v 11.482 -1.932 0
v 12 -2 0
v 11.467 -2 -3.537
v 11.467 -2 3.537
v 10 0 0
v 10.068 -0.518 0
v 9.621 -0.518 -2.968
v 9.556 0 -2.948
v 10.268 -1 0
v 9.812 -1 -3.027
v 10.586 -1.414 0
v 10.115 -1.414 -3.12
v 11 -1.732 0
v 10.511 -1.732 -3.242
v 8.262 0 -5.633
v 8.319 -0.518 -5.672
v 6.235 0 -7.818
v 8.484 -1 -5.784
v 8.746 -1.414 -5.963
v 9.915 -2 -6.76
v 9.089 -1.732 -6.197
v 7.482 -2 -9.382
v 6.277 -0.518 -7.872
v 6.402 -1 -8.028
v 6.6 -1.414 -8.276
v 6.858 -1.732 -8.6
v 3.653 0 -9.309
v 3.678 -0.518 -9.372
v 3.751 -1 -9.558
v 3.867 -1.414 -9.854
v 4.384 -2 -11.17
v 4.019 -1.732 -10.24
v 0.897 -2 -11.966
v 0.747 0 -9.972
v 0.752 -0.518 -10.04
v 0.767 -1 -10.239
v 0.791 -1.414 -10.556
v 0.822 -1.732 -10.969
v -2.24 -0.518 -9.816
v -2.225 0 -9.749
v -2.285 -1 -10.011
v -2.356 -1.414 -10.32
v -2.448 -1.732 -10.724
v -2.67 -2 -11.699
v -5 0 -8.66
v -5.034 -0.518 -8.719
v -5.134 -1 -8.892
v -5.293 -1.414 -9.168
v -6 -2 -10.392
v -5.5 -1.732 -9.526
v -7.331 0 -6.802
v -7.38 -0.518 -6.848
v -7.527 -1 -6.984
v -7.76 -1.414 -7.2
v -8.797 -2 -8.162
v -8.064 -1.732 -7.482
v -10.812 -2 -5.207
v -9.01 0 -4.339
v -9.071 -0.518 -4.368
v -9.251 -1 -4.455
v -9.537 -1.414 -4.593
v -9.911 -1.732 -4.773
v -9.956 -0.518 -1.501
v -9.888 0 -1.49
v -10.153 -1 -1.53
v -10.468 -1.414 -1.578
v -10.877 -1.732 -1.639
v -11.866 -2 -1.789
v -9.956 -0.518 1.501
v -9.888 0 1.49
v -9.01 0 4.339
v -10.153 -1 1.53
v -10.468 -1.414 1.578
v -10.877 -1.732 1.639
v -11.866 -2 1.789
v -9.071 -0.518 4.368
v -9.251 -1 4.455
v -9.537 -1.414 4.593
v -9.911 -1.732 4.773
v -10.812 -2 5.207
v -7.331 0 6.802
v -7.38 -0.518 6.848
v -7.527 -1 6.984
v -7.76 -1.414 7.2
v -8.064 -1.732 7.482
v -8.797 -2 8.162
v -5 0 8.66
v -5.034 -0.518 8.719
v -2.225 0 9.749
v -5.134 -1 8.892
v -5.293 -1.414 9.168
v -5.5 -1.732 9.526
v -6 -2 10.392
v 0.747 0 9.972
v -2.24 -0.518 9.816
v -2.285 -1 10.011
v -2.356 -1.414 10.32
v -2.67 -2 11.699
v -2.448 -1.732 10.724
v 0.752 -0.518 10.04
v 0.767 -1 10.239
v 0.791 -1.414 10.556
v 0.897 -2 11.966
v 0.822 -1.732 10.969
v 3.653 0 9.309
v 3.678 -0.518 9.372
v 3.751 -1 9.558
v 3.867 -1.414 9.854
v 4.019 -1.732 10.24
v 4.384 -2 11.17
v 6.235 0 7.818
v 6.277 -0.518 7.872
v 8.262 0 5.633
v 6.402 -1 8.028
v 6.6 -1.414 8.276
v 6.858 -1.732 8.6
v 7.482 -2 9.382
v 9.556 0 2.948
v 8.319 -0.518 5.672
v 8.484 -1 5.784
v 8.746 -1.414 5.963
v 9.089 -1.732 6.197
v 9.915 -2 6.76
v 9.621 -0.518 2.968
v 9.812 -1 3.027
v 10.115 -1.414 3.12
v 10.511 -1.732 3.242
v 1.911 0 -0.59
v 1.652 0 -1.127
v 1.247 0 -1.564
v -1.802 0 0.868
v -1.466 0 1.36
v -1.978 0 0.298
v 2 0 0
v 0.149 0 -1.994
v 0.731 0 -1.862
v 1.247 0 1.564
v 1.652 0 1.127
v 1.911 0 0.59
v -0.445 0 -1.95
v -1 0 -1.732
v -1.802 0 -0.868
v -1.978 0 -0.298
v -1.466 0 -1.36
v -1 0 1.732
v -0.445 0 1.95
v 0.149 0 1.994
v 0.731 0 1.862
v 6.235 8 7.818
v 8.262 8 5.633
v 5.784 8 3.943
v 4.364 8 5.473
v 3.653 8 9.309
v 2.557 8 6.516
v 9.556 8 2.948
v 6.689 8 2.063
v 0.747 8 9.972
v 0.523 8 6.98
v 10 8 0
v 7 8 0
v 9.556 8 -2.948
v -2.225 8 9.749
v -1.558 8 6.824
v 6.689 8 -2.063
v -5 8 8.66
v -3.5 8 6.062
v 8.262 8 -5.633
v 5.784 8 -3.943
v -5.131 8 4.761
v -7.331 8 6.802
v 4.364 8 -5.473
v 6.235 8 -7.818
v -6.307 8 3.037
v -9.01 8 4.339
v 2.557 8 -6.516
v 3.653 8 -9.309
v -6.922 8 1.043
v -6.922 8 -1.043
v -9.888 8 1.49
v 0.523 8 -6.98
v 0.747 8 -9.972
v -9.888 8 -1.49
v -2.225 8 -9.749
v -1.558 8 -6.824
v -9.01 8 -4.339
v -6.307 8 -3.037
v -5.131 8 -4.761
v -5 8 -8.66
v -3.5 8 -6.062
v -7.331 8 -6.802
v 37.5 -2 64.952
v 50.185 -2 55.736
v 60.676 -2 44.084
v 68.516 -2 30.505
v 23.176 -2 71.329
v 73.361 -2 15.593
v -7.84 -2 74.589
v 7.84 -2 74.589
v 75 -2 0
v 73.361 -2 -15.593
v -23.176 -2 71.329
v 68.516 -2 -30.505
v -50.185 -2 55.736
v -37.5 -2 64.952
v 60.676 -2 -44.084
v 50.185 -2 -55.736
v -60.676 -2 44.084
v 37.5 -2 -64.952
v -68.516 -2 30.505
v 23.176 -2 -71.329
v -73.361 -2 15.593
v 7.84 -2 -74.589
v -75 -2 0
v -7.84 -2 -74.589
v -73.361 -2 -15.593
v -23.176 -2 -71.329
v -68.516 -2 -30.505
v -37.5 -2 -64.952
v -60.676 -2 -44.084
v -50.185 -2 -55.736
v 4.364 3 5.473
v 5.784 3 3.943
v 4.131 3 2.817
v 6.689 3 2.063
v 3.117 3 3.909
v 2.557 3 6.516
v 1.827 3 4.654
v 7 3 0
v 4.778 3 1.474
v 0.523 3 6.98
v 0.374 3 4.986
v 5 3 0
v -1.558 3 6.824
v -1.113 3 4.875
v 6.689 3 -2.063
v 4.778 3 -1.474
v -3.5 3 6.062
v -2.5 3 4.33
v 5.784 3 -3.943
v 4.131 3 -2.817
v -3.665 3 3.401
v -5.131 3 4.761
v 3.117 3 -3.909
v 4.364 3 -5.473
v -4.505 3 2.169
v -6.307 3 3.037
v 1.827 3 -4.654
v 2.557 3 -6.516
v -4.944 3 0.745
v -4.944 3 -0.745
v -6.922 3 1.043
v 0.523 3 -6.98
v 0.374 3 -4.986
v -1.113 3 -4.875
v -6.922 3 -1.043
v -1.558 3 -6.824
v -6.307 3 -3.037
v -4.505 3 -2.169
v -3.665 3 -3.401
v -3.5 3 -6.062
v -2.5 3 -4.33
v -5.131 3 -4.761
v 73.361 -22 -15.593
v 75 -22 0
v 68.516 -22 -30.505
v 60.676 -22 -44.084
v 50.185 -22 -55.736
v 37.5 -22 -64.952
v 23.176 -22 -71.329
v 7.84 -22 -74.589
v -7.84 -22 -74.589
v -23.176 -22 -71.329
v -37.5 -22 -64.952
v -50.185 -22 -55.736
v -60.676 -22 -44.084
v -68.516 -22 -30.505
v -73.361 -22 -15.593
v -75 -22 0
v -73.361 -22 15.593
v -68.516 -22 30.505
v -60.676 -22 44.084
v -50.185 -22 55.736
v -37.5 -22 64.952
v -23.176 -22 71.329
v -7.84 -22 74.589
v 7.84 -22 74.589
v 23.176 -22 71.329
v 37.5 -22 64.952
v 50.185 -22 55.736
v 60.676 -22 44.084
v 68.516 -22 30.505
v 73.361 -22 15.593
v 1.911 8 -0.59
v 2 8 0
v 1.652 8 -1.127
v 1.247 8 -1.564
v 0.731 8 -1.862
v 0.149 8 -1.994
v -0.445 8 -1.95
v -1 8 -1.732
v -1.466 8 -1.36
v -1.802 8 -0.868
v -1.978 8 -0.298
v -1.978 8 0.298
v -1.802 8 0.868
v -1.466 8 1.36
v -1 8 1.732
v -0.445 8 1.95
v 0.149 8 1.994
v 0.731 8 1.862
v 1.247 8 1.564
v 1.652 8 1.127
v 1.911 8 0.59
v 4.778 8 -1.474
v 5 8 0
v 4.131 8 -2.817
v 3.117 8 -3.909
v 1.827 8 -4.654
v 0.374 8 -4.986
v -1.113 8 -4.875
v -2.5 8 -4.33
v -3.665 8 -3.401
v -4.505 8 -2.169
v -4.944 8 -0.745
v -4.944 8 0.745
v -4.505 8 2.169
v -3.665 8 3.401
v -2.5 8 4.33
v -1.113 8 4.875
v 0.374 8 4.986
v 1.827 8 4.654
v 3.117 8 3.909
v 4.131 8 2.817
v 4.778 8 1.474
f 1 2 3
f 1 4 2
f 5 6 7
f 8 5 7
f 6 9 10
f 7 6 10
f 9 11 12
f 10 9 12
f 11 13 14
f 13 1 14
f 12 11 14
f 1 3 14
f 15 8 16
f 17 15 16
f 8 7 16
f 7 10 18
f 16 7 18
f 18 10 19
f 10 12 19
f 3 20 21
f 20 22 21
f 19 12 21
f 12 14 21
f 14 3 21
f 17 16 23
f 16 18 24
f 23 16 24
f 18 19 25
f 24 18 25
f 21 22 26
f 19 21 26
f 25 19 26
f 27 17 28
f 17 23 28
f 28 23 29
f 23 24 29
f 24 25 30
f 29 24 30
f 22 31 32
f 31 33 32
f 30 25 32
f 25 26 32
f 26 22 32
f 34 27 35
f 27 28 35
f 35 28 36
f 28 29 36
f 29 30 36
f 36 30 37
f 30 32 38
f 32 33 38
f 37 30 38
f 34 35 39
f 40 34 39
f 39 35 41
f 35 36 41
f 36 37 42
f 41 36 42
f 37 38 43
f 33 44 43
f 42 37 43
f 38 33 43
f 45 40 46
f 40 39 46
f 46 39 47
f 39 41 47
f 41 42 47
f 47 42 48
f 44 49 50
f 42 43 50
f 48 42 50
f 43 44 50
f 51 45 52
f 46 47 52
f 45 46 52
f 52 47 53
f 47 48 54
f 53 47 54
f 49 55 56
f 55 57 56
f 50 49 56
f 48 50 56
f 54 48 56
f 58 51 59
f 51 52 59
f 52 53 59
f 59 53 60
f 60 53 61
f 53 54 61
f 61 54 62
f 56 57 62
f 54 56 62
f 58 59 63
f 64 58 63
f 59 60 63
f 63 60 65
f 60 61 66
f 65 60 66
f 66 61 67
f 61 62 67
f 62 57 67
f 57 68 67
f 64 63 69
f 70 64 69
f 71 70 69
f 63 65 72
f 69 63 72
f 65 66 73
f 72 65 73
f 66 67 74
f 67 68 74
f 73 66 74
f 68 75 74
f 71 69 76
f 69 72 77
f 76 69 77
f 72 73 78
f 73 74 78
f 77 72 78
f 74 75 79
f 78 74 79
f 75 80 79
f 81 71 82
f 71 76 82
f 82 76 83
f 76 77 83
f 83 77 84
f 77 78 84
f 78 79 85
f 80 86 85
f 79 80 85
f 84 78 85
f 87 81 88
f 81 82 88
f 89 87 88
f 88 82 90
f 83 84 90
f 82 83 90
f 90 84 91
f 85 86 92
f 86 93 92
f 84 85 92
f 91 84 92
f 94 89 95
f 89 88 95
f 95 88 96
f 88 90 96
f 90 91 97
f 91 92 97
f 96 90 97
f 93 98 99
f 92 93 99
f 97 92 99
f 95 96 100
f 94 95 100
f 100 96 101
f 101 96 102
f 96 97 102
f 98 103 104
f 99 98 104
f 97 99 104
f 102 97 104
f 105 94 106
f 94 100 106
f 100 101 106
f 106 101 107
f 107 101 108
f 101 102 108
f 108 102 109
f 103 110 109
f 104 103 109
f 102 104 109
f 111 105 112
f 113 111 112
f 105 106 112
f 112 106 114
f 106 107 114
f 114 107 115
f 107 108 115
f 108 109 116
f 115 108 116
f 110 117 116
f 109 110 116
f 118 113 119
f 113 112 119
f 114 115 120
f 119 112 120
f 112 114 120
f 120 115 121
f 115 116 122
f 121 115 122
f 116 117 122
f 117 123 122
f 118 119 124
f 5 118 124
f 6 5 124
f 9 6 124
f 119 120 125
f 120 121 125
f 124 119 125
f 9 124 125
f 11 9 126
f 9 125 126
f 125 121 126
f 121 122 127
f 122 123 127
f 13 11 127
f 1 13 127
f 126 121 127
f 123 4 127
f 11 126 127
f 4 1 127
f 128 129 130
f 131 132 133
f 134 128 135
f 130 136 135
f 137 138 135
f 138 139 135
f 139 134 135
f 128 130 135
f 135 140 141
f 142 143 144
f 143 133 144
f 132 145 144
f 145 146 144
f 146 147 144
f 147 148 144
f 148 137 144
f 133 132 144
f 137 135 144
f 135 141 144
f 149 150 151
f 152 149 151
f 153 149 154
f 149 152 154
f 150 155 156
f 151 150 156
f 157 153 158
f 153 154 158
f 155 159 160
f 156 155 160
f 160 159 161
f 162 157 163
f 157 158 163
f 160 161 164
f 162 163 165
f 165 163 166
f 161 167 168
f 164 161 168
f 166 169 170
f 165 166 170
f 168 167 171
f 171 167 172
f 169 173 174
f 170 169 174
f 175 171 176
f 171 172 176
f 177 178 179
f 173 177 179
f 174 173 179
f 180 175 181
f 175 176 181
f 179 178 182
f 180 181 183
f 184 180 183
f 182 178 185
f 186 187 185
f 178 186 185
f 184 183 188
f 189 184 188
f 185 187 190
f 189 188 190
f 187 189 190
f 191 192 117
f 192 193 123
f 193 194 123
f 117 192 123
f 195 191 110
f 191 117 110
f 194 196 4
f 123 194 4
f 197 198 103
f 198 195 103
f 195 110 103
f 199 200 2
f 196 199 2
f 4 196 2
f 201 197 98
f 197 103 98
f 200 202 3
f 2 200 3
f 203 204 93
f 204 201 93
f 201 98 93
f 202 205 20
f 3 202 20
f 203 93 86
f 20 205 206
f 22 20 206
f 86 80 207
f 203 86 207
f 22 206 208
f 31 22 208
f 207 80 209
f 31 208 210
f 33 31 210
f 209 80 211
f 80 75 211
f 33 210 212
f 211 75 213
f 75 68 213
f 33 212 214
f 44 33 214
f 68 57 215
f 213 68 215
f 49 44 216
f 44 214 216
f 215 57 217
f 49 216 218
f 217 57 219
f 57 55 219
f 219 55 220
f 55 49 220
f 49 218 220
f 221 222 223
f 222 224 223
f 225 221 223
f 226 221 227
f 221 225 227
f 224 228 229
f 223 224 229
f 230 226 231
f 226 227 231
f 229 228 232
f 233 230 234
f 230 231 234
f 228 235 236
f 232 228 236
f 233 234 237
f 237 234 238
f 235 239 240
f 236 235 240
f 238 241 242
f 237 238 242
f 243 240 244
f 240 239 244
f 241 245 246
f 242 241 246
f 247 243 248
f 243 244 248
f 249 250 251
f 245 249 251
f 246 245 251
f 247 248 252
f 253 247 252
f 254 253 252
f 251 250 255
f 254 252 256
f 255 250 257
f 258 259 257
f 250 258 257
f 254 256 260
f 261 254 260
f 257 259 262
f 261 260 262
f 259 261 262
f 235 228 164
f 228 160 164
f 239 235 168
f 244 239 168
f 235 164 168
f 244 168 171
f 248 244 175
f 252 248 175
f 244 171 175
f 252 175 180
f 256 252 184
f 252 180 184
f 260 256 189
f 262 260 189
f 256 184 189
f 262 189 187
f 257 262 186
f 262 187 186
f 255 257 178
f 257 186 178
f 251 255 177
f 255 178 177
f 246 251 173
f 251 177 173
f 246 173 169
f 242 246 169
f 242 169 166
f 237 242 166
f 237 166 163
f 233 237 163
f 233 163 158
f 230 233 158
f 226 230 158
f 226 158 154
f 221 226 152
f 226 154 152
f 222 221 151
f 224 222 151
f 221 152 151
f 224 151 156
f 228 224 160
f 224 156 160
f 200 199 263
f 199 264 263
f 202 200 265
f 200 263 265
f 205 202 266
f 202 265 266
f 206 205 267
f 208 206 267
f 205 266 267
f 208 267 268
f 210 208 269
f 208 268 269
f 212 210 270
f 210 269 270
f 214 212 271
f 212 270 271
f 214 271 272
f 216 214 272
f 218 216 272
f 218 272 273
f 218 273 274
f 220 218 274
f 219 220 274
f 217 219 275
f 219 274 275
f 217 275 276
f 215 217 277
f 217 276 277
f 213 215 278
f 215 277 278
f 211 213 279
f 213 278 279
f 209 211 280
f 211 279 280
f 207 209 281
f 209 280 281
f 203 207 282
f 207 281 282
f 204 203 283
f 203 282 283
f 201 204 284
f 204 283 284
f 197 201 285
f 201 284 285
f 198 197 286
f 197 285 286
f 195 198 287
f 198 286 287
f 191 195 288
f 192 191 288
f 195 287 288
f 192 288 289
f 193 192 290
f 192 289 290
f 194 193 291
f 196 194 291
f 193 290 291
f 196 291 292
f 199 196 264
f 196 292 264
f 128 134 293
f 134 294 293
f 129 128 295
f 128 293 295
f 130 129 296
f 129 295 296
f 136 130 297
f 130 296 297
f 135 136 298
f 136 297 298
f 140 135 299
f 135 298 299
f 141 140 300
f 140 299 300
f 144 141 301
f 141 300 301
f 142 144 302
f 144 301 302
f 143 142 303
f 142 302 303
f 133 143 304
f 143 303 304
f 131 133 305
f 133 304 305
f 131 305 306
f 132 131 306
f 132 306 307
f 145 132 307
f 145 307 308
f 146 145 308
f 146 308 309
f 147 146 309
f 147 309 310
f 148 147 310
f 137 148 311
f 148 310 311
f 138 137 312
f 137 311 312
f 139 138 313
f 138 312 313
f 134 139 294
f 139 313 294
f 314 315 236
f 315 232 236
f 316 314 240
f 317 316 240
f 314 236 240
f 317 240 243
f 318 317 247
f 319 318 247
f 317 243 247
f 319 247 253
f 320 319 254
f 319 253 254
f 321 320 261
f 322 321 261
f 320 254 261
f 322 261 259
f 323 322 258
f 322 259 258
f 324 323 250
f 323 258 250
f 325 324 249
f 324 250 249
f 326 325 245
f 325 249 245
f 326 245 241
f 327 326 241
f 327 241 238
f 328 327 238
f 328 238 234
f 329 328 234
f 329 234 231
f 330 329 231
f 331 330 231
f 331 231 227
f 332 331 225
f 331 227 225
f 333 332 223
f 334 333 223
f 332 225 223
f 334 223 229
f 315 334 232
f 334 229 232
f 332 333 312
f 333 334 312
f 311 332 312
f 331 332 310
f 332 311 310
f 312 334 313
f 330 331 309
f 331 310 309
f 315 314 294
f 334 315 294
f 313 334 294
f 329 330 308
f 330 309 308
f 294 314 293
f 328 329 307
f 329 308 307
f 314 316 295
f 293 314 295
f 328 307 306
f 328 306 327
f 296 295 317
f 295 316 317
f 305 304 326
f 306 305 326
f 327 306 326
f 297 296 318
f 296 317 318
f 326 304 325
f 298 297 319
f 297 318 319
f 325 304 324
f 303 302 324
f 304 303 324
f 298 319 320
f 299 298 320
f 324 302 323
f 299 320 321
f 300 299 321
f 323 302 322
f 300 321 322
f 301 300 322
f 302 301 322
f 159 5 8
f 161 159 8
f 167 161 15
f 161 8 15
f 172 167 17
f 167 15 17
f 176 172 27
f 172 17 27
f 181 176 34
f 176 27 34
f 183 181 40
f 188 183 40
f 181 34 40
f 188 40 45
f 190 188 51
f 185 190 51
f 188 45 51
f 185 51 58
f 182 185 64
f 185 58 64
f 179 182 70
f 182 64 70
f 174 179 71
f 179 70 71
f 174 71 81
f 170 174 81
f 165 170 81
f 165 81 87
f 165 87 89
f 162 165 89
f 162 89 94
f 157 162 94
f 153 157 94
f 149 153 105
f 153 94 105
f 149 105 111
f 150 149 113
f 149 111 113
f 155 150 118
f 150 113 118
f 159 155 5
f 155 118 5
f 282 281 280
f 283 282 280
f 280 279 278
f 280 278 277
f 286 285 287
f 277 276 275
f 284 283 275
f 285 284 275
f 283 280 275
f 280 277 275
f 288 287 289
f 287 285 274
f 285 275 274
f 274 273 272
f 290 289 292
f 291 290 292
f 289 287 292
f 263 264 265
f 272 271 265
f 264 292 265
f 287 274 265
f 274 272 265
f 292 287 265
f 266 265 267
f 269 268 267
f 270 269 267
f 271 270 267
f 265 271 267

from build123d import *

# Parameters (mm, degrees)
FILLET_1_R = 2


with BuildPart() as part:
    # 草图1 → 旋转1 (revolve)
    with BuildSketch(Plane.XY, mode=Mode.PRIVATE) as revolve_1_sk:
        Polygon((0, 0), (-2, 0), (-2, 8), (-5, 8), (-5, 3), (-7, 3), (-7, 8), (-10, 8), (-10, -2), (-75, -2), (-75, -22), (0, -22), align=None)
    revolve(revolve_1_sk.sketch.rotate(Axis((0, -198.175933826, 0), (0, 1, 0)), 180), axis=Axis((0, -198.175933826, 0), (0, 1, 0)))

    # 圆角1
    fillet_1_edges = [part.edges().sort_by_distance(p)[0] for p in [
        (-10, -2, 0),
    ]]
    fillet(fillet_1_edges, radius=FILLET_1_R)


solid = part.part
